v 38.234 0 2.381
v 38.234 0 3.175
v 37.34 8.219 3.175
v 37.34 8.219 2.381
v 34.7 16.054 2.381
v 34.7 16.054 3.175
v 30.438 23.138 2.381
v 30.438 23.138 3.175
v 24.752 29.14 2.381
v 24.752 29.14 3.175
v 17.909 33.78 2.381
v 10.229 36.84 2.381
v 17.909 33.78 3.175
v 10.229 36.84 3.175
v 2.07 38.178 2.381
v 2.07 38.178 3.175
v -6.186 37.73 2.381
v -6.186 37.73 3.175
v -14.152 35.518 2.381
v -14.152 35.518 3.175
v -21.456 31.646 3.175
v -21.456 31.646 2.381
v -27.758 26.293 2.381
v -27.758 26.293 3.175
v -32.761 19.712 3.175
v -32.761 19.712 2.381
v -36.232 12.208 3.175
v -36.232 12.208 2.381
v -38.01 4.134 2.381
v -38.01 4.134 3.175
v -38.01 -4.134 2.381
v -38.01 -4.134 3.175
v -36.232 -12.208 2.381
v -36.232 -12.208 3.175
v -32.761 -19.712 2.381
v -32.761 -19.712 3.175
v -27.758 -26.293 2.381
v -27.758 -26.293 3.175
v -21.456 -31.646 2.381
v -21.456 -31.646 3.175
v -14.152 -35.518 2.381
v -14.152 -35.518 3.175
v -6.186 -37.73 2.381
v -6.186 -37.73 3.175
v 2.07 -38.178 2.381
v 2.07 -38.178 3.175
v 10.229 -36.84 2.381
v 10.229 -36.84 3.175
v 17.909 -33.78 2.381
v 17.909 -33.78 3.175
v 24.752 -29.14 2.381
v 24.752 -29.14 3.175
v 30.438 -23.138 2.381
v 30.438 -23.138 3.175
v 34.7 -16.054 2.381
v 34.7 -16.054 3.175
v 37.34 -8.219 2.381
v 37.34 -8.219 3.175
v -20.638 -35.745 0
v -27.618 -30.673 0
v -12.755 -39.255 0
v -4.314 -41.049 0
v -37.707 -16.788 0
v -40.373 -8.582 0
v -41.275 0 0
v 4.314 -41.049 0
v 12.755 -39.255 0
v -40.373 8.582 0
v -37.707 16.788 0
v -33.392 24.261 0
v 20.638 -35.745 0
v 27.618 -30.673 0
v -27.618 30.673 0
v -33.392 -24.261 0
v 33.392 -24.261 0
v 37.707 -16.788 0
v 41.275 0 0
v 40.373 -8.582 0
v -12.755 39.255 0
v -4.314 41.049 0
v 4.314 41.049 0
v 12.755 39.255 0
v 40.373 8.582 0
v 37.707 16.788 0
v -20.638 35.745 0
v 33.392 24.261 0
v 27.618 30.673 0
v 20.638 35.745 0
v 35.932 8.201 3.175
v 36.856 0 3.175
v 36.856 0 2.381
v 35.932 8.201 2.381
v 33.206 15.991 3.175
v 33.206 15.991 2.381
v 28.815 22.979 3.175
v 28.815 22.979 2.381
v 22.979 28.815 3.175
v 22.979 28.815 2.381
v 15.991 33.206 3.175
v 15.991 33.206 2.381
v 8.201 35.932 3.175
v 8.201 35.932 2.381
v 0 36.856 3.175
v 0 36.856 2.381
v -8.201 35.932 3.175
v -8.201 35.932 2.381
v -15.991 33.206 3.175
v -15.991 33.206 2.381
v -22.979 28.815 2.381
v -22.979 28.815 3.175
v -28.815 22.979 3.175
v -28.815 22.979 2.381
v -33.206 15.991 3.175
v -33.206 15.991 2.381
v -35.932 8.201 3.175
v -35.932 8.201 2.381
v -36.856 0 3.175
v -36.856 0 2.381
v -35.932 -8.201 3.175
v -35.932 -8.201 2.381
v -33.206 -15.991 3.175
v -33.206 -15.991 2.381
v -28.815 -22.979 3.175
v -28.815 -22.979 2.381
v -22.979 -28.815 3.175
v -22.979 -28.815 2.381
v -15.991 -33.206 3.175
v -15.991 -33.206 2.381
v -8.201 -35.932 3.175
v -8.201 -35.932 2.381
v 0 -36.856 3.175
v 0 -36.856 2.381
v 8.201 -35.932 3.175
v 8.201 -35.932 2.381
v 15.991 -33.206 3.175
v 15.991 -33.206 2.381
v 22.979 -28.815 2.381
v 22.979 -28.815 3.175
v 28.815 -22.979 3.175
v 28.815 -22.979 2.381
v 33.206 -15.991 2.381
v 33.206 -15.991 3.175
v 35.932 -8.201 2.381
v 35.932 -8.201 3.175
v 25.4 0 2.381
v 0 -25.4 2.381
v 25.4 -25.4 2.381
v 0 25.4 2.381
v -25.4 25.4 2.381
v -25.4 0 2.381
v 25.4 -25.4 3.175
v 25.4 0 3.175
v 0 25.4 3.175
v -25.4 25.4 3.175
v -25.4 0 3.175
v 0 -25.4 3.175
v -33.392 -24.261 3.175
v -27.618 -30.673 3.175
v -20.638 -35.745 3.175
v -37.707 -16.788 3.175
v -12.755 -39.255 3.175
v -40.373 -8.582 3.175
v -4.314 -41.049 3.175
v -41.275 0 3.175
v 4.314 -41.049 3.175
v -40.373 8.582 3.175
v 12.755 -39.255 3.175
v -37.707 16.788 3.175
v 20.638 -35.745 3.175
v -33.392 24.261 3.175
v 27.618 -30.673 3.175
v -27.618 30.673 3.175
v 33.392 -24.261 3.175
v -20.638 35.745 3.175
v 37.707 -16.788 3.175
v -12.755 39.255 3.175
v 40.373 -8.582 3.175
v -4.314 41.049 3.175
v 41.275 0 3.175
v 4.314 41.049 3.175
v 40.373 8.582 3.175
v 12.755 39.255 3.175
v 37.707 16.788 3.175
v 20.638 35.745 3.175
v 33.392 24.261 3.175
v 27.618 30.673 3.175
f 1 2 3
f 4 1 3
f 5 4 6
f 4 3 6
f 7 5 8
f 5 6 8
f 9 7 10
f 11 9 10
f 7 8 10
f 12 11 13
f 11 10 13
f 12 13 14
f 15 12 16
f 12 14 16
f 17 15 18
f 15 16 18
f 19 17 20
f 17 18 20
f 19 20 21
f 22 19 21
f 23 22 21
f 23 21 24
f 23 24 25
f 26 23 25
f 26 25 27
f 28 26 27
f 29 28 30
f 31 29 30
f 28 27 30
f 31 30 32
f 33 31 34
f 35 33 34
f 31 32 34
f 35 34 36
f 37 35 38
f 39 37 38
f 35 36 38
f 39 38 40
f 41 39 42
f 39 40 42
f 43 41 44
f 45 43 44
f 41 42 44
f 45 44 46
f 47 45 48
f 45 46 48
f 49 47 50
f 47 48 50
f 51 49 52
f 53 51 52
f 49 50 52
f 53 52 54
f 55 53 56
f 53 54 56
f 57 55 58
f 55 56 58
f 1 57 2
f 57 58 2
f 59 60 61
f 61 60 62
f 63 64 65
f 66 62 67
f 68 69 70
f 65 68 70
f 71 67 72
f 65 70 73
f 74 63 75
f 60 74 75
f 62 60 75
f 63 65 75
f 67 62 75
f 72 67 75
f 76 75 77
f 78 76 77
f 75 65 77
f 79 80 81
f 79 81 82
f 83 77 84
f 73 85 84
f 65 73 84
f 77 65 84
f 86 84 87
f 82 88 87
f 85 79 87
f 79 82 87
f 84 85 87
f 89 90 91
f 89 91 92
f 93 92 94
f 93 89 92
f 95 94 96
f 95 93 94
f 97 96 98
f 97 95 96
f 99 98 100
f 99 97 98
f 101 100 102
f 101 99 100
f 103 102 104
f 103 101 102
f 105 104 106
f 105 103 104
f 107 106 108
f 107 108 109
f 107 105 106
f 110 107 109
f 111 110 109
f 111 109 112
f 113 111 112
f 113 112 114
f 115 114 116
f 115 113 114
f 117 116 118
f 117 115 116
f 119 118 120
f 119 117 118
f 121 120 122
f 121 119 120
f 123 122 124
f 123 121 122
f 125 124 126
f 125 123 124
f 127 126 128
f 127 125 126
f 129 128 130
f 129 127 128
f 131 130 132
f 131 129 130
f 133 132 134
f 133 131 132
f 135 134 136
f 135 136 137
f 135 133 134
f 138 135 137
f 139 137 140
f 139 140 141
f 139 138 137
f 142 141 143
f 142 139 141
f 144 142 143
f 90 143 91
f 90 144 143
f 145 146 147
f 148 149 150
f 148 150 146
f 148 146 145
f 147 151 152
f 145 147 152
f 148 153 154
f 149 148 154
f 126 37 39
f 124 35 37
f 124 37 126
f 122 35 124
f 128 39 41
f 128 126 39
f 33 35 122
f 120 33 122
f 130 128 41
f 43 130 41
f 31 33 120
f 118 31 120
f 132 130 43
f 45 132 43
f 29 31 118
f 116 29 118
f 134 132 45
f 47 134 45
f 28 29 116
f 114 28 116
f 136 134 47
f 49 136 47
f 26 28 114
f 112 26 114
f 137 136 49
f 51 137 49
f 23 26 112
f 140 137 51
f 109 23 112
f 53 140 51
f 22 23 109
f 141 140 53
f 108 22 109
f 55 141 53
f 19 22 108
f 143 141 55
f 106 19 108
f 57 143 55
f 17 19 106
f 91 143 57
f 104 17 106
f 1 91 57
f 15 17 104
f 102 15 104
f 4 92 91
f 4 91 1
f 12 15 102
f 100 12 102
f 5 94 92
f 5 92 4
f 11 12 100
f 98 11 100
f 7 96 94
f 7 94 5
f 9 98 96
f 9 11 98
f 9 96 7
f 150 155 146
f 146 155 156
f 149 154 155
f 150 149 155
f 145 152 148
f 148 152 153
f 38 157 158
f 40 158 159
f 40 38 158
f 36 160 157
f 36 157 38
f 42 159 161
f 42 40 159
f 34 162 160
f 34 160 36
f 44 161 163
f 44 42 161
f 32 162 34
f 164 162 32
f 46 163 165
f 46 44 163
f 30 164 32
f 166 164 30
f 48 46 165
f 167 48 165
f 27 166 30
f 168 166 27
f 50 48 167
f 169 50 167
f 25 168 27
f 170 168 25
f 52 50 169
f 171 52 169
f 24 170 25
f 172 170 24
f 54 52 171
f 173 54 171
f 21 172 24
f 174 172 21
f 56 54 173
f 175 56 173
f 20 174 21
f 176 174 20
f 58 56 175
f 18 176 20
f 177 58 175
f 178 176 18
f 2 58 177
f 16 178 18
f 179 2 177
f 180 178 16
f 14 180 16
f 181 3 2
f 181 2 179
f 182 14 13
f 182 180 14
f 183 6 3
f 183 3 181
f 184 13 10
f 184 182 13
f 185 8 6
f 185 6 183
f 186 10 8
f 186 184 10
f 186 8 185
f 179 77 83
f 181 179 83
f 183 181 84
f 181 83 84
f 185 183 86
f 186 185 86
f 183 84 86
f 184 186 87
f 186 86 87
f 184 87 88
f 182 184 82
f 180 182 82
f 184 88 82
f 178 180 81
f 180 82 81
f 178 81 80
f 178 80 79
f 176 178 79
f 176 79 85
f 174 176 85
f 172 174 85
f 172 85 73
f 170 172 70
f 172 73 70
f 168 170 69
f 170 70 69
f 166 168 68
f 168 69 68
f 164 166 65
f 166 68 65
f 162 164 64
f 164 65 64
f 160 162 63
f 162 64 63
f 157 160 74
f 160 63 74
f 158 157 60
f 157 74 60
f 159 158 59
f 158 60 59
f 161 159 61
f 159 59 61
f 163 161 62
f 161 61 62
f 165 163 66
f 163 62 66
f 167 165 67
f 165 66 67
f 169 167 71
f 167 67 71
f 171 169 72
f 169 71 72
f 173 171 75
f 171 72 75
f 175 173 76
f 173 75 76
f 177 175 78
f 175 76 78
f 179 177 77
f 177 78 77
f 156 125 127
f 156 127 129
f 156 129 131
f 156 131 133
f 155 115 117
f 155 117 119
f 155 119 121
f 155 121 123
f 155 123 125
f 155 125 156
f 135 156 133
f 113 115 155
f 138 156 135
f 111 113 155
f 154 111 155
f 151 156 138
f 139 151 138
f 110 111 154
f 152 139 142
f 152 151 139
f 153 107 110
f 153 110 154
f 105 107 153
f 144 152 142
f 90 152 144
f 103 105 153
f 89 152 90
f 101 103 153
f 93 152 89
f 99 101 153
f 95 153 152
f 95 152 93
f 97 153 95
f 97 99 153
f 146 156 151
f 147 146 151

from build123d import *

# Parameters (mm, degrees)
F0_R     = 41.275
F1_DEPTH = 3.175
F2_R     = 38.2337964231
F2_R_2   = 36.8557965157
F3_DEPTH = 0.79375
F5_DEPTH = 0.79375


# Not quite as in the source:
# - a length typed as a fraction of an inch, garbled in the dataset ("3 / 203.2 mm" for 3/8 in), is restored


with BuildPart() as f1:
    # F0 (on Top) → F1 (new body)
    with BuildSketch(Plane.XY):
        Circle(F0_R)
    extrude(amount=F1_DEPTH)

    # F2 (on face) → F3 (cut)
    with BuildSketch(Plane.XY.offset(3.175)):
        Circle(F2_R)
        Circle(F2_R_2, mode=Mode.SUBTRACT)
    extrude(amount=-F3_DEPTH, mode=Mode.SUBTRACT)

    # F4 (on face) → F5 (cut)
    with BuildSketch(Plane.XY.offset(3.175)):
        Polygon((25.4, 0), (0, 25.4), (-25.4, 25.4), (-25.4, 0), (0, -25.4), (25.4, -25.4), align=None)
    extrude(amount=-F5_DEPTH, mode=Mode.SUBTRACT)


solid = f1.part
